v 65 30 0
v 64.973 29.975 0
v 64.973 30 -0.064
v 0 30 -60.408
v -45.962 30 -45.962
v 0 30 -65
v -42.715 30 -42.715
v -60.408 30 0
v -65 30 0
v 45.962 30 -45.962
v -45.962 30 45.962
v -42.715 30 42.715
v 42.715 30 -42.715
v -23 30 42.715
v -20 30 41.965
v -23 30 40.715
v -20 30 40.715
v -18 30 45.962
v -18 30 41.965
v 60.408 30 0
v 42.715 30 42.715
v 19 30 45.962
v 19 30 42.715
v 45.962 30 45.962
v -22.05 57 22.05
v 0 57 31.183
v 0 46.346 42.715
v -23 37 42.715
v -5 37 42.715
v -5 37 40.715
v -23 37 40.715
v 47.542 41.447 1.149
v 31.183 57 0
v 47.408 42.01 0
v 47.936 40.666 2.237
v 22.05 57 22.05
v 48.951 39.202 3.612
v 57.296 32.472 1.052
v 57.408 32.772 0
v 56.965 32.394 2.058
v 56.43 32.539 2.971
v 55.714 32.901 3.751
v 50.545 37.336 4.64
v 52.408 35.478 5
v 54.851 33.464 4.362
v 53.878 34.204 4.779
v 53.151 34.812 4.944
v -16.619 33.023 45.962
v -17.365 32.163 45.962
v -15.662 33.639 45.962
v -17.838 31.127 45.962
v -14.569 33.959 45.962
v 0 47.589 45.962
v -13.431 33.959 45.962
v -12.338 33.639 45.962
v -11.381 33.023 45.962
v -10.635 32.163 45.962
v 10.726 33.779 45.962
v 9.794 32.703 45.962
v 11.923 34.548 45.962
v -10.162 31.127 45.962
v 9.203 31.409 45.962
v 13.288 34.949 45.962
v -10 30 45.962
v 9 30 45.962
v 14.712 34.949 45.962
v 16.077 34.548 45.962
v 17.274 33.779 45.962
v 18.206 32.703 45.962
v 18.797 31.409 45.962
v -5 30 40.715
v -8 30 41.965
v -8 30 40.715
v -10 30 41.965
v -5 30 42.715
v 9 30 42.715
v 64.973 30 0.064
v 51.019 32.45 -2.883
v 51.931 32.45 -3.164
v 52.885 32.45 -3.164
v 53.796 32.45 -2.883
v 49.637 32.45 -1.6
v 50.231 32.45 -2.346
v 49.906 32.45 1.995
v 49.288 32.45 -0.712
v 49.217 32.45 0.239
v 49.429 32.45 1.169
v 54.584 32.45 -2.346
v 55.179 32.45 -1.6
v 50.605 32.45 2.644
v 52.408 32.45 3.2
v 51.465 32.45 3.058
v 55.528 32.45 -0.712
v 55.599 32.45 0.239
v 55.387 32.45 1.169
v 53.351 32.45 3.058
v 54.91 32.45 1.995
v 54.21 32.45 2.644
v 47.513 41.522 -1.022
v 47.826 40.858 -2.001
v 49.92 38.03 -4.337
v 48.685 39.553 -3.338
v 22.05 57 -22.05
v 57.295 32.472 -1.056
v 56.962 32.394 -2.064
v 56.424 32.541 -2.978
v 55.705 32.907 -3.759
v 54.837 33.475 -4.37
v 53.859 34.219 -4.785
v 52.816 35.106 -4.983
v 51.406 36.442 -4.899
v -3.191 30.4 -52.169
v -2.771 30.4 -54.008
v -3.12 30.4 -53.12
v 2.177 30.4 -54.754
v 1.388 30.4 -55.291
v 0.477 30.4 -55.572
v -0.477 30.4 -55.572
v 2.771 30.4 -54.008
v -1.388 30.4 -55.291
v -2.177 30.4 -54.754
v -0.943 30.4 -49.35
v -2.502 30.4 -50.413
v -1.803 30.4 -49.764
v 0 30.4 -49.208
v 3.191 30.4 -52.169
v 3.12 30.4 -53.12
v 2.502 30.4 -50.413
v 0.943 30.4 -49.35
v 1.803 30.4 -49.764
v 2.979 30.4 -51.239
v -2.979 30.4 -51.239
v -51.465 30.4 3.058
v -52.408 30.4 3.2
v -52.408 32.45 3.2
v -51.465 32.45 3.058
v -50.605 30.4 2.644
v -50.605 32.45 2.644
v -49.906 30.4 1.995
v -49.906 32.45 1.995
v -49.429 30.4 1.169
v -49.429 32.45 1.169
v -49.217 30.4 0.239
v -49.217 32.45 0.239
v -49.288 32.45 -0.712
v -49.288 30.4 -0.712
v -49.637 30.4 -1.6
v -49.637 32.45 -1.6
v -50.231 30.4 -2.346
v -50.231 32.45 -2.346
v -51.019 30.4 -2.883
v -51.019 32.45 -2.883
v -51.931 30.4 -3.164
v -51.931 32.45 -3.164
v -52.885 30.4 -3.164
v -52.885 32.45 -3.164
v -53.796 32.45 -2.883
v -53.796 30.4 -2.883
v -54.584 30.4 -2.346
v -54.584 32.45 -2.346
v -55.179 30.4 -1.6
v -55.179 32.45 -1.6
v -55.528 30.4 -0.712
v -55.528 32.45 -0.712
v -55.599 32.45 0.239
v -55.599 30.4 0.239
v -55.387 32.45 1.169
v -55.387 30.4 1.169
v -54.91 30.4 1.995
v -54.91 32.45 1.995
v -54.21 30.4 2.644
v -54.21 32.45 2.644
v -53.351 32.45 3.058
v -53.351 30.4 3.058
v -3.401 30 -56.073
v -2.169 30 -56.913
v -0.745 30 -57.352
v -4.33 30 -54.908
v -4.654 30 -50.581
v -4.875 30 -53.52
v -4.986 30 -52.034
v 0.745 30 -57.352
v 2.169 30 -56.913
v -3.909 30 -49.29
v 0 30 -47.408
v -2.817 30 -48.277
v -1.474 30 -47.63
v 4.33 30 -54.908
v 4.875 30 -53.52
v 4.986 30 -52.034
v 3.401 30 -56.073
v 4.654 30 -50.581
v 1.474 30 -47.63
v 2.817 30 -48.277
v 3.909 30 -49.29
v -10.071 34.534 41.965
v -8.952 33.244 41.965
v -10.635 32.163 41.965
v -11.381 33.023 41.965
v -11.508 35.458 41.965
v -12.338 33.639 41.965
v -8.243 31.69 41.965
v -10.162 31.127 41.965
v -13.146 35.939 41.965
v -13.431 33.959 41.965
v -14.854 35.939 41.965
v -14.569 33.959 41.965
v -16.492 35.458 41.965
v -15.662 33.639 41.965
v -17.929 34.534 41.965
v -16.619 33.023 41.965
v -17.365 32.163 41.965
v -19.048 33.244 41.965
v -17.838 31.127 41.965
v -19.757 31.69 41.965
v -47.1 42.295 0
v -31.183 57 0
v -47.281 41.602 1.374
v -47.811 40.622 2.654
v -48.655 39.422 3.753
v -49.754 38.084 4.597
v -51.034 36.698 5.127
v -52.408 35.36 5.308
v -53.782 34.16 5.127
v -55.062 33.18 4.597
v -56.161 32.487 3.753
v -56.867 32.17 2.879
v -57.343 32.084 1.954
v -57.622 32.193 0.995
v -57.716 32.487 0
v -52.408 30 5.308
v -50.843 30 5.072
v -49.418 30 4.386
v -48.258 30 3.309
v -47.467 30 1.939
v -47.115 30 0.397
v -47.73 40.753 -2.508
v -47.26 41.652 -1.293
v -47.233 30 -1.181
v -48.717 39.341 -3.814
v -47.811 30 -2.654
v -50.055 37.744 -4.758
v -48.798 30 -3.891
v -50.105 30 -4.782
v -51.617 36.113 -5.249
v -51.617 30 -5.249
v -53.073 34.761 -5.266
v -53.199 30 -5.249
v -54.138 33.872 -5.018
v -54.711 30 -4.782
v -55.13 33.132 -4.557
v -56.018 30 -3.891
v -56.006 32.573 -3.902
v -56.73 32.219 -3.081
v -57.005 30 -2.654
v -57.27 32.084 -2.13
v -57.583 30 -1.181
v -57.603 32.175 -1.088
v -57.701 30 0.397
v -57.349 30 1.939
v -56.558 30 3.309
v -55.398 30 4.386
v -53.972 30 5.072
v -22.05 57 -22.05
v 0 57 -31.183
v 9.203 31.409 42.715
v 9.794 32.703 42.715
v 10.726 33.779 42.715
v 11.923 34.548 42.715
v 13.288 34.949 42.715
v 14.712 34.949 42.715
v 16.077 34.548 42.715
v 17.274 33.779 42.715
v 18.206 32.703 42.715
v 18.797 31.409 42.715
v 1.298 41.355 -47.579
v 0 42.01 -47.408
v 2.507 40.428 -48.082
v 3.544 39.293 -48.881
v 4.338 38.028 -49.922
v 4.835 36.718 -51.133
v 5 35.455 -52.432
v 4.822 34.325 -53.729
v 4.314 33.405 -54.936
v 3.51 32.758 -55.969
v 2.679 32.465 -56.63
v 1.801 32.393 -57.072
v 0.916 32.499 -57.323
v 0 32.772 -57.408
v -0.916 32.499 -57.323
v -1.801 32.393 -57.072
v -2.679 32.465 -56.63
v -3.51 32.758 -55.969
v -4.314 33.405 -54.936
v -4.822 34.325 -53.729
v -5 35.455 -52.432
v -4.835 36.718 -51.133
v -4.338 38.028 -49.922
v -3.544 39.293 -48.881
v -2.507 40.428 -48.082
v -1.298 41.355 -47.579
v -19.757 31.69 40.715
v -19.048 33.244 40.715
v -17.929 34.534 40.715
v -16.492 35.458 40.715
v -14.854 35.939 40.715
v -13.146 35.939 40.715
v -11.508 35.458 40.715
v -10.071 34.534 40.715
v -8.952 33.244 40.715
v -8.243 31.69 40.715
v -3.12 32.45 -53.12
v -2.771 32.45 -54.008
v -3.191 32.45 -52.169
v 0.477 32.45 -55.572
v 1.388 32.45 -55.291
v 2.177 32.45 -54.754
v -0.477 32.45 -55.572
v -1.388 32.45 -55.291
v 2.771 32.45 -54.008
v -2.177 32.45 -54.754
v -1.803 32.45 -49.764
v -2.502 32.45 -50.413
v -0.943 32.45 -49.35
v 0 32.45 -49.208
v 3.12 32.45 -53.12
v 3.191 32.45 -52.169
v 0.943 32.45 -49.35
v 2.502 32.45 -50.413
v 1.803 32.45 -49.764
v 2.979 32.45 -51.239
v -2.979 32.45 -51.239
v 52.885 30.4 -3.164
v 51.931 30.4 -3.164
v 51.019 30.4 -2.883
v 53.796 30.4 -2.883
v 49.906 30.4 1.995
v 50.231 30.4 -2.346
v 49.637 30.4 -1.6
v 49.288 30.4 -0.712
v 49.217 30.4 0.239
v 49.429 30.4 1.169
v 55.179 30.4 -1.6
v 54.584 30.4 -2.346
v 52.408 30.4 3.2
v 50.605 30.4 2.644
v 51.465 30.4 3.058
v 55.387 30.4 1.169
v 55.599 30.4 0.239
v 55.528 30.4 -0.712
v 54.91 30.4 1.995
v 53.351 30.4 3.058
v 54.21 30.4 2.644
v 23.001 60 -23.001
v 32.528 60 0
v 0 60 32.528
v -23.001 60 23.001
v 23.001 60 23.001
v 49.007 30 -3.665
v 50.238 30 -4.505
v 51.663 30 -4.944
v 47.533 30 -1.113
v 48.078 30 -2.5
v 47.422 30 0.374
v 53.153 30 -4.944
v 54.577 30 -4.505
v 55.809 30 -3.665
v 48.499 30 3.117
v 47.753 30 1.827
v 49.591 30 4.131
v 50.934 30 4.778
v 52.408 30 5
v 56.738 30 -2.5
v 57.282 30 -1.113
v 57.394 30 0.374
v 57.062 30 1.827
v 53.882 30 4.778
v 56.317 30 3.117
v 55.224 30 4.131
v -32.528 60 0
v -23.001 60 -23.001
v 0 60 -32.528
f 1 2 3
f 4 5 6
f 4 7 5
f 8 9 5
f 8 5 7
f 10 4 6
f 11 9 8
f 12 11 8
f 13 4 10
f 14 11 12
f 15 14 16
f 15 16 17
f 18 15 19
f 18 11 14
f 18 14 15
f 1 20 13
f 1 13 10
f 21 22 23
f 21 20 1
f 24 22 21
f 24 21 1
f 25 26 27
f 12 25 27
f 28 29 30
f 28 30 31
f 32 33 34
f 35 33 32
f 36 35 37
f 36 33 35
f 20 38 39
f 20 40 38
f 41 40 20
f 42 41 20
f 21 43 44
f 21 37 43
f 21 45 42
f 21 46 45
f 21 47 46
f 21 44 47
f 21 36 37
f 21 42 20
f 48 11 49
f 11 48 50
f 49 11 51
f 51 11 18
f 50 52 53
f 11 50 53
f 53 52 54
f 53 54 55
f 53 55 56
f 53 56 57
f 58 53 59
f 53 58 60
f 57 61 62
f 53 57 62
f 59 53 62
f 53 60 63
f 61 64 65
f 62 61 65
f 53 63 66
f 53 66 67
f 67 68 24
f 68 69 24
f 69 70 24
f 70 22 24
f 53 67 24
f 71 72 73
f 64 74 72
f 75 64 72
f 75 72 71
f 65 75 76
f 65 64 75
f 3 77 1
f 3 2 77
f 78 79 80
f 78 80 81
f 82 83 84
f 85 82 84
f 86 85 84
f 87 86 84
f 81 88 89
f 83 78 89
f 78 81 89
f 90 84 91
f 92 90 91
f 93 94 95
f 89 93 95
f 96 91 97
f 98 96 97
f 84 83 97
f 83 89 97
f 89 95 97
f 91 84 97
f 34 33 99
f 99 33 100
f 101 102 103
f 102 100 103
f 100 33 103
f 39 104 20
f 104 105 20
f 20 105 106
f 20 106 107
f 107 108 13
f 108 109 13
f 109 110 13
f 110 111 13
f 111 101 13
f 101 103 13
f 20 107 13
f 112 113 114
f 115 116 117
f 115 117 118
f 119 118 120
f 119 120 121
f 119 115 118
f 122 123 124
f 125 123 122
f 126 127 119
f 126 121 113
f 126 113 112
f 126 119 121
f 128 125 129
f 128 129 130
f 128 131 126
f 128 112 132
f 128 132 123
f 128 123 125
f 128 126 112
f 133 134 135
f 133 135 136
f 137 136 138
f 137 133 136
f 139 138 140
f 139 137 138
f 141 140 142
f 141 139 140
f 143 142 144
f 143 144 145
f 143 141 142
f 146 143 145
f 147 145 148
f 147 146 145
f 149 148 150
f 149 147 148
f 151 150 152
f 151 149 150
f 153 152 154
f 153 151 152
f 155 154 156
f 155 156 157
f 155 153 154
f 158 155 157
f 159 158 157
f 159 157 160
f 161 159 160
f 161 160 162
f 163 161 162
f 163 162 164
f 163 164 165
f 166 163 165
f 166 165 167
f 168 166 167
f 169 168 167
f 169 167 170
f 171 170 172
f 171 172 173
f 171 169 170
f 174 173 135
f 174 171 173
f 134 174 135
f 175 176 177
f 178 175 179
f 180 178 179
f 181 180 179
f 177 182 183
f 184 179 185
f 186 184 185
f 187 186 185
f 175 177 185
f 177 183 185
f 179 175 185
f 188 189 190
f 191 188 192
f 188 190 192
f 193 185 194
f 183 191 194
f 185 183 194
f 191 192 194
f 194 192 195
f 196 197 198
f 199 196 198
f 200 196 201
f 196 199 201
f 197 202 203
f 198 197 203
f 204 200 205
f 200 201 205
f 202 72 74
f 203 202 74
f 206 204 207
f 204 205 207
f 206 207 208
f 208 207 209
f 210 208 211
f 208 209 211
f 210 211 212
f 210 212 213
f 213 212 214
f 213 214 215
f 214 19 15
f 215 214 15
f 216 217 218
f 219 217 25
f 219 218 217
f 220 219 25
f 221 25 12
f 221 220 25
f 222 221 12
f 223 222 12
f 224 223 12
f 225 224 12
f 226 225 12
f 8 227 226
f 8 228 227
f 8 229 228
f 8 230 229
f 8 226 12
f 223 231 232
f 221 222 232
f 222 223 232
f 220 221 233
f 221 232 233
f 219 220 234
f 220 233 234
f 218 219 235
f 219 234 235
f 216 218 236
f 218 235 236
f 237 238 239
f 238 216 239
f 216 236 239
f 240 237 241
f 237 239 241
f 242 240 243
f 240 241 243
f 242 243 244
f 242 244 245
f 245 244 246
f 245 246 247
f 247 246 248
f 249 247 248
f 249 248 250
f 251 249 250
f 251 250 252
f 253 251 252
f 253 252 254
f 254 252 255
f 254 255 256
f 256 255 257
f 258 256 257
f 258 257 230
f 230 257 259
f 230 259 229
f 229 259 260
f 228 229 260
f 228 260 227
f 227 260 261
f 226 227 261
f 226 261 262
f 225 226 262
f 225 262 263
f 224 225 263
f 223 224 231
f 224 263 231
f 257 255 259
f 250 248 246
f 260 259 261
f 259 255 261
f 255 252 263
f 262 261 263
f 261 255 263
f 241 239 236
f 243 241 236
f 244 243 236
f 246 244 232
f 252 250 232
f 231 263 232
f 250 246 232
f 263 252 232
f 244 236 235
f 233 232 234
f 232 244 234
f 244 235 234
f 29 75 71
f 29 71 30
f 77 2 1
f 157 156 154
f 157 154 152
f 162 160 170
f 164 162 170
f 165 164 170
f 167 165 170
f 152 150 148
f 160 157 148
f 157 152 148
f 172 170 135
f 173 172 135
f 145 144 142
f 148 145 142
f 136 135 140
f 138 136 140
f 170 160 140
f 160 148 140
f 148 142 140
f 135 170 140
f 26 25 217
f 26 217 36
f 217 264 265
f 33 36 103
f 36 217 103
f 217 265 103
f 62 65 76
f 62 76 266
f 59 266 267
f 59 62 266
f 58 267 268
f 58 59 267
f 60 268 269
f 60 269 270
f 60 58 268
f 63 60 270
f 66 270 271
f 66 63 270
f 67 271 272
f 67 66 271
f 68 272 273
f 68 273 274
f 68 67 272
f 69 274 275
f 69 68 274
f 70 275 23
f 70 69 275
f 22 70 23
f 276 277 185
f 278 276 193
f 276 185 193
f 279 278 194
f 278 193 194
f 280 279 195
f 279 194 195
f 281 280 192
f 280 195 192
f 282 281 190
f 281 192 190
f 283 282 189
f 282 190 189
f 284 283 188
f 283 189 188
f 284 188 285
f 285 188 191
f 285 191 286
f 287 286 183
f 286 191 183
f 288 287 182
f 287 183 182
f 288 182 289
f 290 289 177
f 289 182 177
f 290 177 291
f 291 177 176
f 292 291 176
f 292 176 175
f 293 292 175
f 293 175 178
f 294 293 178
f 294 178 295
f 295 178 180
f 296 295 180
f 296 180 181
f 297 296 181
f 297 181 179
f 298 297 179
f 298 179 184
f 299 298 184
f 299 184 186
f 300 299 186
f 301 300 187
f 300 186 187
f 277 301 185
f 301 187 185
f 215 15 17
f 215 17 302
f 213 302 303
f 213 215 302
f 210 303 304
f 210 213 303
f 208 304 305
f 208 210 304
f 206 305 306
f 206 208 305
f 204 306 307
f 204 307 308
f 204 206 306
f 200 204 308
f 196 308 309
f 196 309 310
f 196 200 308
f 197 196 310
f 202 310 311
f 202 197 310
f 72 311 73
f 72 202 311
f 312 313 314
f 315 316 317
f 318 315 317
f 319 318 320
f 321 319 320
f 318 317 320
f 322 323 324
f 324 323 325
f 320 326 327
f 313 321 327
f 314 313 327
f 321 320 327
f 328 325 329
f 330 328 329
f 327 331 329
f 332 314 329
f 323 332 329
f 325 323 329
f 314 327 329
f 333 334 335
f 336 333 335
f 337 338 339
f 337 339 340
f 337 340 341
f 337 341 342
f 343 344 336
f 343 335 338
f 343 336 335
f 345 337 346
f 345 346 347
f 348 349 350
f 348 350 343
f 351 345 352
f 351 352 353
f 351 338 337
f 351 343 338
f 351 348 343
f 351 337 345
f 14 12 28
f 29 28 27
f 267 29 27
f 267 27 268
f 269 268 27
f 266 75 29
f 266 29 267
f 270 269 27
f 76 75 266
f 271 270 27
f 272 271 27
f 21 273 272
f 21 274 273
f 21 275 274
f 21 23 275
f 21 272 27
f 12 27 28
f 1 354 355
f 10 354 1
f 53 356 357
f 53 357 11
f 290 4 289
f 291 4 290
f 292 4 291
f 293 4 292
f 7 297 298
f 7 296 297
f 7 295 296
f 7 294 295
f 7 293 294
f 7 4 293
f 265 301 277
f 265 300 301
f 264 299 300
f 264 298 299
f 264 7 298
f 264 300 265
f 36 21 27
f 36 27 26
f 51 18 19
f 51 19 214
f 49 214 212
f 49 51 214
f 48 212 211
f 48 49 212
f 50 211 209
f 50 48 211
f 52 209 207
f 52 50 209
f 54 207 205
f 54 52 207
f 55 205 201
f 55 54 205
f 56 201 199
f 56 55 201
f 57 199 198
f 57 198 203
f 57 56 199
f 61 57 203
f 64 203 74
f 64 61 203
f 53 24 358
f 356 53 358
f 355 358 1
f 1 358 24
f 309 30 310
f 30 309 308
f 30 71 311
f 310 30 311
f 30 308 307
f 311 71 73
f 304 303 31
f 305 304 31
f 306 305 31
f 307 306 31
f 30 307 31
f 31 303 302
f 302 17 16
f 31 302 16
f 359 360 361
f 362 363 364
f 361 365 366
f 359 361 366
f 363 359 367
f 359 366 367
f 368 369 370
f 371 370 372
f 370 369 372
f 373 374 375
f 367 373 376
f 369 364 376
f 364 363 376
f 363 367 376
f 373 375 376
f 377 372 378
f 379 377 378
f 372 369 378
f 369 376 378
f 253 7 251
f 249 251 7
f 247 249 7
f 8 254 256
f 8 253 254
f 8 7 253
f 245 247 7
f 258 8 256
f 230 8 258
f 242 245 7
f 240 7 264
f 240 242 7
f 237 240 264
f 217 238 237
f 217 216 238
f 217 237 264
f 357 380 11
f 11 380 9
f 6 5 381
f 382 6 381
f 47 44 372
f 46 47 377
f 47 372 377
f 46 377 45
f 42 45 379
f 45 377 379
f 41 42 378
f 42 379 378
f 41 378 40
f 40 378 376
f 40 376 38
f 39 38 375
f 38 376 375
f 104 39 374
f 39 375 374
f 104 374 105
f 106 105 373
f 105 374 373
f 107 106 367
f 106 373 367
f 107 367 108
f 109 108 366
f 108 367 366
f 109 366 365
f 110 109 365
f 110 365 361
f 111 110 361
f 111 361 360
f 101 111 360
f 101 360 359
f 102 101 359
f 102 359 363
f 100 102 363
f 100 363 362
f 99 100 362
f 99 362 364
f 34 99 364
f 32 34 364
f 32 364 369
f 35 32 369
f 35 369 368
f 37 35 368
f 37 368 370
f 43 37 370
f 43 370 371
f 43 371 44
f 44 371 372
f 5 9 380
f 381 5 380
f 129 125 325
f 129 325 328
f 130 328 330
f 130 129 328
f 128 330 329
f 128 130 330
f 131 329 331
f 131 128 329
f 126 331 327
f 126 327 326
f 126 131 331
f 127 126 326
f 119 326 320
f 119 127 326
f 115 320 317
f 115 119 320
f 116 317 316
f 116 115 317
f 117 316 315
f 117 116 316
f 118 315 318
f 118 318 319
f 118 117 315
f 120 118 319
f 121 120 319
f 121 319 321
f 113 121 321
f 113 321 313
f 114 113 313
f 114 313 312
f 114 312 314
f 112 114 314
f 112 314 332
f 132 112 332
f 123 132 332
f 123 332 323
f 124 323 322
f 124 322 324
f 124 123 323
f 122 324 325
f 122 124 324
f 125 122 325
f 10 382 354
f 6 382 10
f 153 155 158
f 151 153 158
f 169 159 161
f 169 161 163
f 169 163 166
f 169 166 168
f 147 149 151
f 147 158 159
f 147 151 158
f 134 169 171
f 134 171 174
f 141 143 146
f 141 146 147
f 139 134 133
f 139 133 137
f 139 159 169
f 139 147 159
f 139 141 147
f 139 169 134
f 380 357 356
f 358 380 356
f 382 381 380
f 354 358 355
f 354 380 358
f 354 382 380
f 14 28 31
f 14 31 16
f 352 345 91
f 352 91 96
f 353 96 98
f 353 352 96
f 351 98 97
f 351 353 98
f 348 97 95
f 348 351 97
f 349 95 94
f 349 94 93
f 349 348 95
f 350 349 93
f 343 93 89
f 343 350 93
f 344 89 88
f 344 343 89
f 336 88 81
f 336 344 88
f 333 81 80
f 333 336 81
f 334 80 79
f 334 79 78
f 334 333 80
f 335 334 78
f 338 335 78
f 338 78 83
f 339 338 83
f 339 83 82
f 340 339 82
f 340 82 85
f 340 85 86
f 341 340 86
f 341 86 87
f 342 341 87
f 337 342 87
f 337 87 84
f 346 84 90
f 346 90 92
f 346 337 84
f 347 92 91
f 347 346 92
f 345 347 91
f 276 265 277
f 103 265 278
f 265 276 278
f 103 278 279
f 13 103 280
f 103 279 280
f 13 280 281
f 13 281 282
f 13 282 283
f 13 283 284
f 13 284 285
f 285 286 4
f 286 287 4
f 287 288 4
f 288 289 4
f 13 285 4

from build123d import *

# Parameters (mm, degrees)
AUFSATZ_LINEAR_AUSTRAGEN1_DEPTH       = 30
SCHNITT_LINEAR_AUSTRAGEN4_DEPTH       = 162.727828845
SCHNITT_LINEAR_AUSTRAGEN5_DEPTH       = 162.727828845
SCHNITT_LINEAR_AUSTRAGEN6_DEPTH       = 162.727828845
SCHNITT_LINEAR_AUSTRAGEN7_DEPTH       = 162.727828845
WANDUNG1_T                            = -3
SCHNITT_LINEAR_AUSTRAGEN12_DEPTH      = 97.695398029
SCHNITT_LINEAR_AUSTRAGEN12_DEPTH_BACK = 97.695398029
AUFSATZ_LINEAR_AUSTRAGEN3_REACH       = 98.695
SKIZZE17_W                            = 85.429528352
SKIZZE17_H                            = 3.247176601
SCHNITT_LINEAR_AUSTRAGEN14_REACH      = 134.051
SKIZZE18_R                            = 4
SKIZZE18_R_2                          = 5
AUFSATZ_LINEAR_AUSTRAGEN4_DEPTH       = 0.75
AUFSATZ_LINEAR_AUSTRAGEN5_DEPTH       = 2
AUFSATZ_LINEAR_AUSTRAGEN9_REACH       = 98.695
SKIZZE23_R                            = 5.307840289
SKIZZE23_R_2                          = 5
SKIZZE25_R                            = 3.2
SCHNITT_LINEAR_AUSTRAGEN15_DEPTH      = 2.05
SCHNITT_LINEAR_AUSTRAGEN16_DEPTH      = 110.772492001
SCHNITT_LINEAR_AUSTRAGEN16_DEPTH_BACK = 110.772492001
SKIZZE26_W                            = 129.973453239
SKIZZE26_H                            = 30


with BuildPart() as part:
    # Skizze1 → Aufsatz-Linear austragen1 (new body)
    with BuildSketch(Plane(origin=(0, 0, 0), x_dir=(1, 0, 0), z_dir=(0, 1, 0))):
        Polygon((45.961940777, -45.961940777), (65, 0), (45.961940777, 45.961940777), (0, 65), (-45.961940777, 45.961940777), (-65, 0), (-45.961940777, -45.961940777), (0, -65), align=None)
    extrude(amount=AUFSATZ_LINEAR_AUSTRAGEN1_DEPTH)

    # Skizze6 → Schnitt-Linear austragen4 (cut, through all)
    with BuildSketch(Plane(origin=(-26.807804712, 0, 64.719765714), x_dir=(0.9238795325112876, 0, 0.3826834323650878), z_dir=(-0.38268343236508773, 0, 0.9238795325112875))):
        Polygon((-60.052169613, 30), (-30.052169613, 0), (-60.052169613, 0), align=None)
        Polygon((30.052169613, 0), (60.052169613, 30), (60.052169613, 0), align=None)
    extrude(amount=-SCHNITT_LINEAR_AUSTRAGEN4_DEPTH, mode=Mode.SUBTRACT)

    # Skizze7 → Schnitt-Linear austragen5 (cut, through all)
    with BuildSketch(Plane(origin=(-64.719765714, 0, 26.807804712), x_dir=(0.3826834323650837, 0, 0.9238795325112893), z_dir=(-0.9238795325112893, 0, 0.3826834323650837))):
        Polygon((-60.052169613, 30), (-30.052169613, 0), (-60.052169613, 0), align=None)
        Polygon((30.052169613, 0), (60.052169613, 0), (60.052169613, 30), align=None)
    extrude(amount=-SCHNITT_LINEAR_AUSTRAGEN5_DEPTH, mode=Mode.SUBTRACT)

    # Skizze8 → Schnitt-Linear austragen6 (cut, through all)
    with BuildSketch(Plane(origin=(-64.719765714, 0, -26.807804712), x_dir=(-0.38268343236508795, 0, 0.9238795325112876), z_dir=(-0.9238795325112876, 0, -0.38268343236508795))):
        Polygon((-60.052169613, 30), (-60.052169613, 0), (-30.052169613, 0), align=None)
        Polygon((60.052169613, 30), (60.052169613, 0), (30.052169613, 0), align=None)
    extrude(amount=-SCHNITT_LINEAR_AUSTRAGEN6_DEPTH, mode=Mode.SUBTRACT)

    # Skizze9 → Schnitt-Linear austragen7 (cut, through all)
    with BuildSketch(Plane(origin=(-26.807804712, 0, -64.719765714), x_dir=(-0.9238795325112894, 0, 0.3826834323650834), z_dir=(-0.3826834323650834, 0, -0.9238795325112894))):
        Polygon((60.052169613, 30), (60.052169613, 0), (30.052169613, 0), align=None)
        Polygon((-60.052169613, 30), (-60.052169613, 0), (-30.052169613, 0), align=None)
    extrude(amount=-SCHNITT_LINEAR_AUSTRAGEN7_DEPTH, mode=Mode.SUBTRACT)

    # Wandung1
    wandung1_openings = [part.faces().sort_by_distance(p)[0] for p in [
        (0, 30, 0),
    ]]
    offset(amount=WANDUNG1_T, openings=wandung1_openings, kind=Kind.INTERSECTION)

    # Skizze15 → Schnitt-Linear austragen12 (cut, two sides: drawn at the far end of the back side and taken through both)
    with BuildSketch(Plane(origin=(0, 0, 0), x_dir=(0, 0, -1), z_dir=(1, 0, 0)).offset(-SCHNITT_LINEAR_AUSTRAGEN12_DEPTH_BACK)):
        Polygon((-45.961940777, 30), (-45.961940777, 12.411126745), (-65, 30), align=None)
    extrude(amount=SCHNITT_LINEAR_AUSTRAGEN12_DEPTH + SCHNITT_LINEAR_AUSTRAGEN12_DEPTH_BACK, mode=Mode.SUBTRACT)

    # Skizze17 → Aufsatz-Linear austragen3 (add, up to next)
    with BuildSketch(Plane(origin=(0, 30, 0), x_dir=(1, 0, 0), z_dir=(0, 1, 0)), mode=Mode.PRIVATE) as aufsatz_linear_austragen3_sk1:
        with Locations((0, -44.338352477)):
            Rectangle(SKIZZE17_W, SKIZZE17_H)
    aufsatz_linear_austragen3_tool1 = extrude(aufsatz_linear_austragen3_sk1.sketch, amount=-AUFSATZ_LINEAR_AUSTRAGEN3_REACH, mode=Mode.PRIVATE) - part.part
    add(aufsatz_linear_austragen3_tool1.solids().sort_by_distance((0, 30, 44.338352))[0])

    # Skizze18 → Schnitt-Linear austragen14 (cut, up to next)
    with BuildSketch(Plane.XY.offset(45.961940777), mode=Mode.PRIVATE) as schnitt_linear_austragen14_sk1:
        with Locations((-14, 30)):
            Circle(SKIZZE18_R)
    schnitt_linear_austragen14_tool1 = extrude(schnitt_linear_austragen14_sk1.sketch, amount=-SCHNITT_LINEAR_AUSTRAGEN14_REACH, mode=Mode.PRIVATE) & part.part
    # Skizze18 → Schnitt-Linear austragen14 (cut, up to next)
    with BuildSketch(Plane.XY.offset(45.961940777), mode=Mode.PRIVATE) as schnitt_linear_austragen14_sk2:
        with Locations((14, 30)):
            Circle(SKIZZE18_R_2)
    schnitt_linear_austragen14_tool2 = extrude(schnitt_linear_austragen14_sk2.sketch, amount=-SCHNITT_LINEAR_AUSTRAGEN14_REACH, mode=Mode.PRIVATE) & part.part
    add(schnitt_linear_austragen14_tool1.solids().sort_by_distance((-14, 30, 45.961941))[0], mode=Mode.SUBTRACT)
    add(schnitt_linear_austragen14_tool2.solids().sort_by_distance((14, 30, 45.961941))[0], mode=Mode.SUBTRACT)

    # Skizze19 → Aufsatz-Linear austragen4 (add)
    with BuildSketch(Plane(origin=(0, 0, 42.714764176), x_dir=(-1, 0, 0), z_dir=(0, 0, -1))):
        with BuildLine():
            Line((10, 30), (8, 30))
            ThreePointArc((8, 30), (14, 24), (20, 30))
            Line((20, 30), (18, 30))
            ThreePointArc((18, 30), (14, 26), (10, 30))
        make_face()
    extrude(amount=AUFSATZ_LINEAR_AUSTRAGEN4_DEPTH)

    # Skizze20 → Aufsatz-Linear austragen5 (add)
    with BuildSketch(Plane(origin=(0, 0, 42.714764176), x_dir=(-1, 0, 0), z_dir=(0, 0, -1))):
        with BuildLine():
            Line((8, 30), (5, 30))
            Line((5, 30), (5, 23))
            Line((5, 23), (23, 23))
            Line((23, 23), (23, 30))
            Line((23, 30), (20, 30))
            ThreePointArc((20, 30), (14, 24), (8, 30))
        make_face()
    extrude(amount=AUFSATZ_LINEAR_AUSTRAGEN5_DEPTH)

    # Skizze23 → Aufsatz-Linear austragen9 (add, up to next)
    with BuildSketch(Plane(origin=(0, 30, 0), x_dir=(1, 0, 0), z_dir=(0, 1, 0)), mode=Mode.PRIVATE) as aufsatz_linear_austragen9_sk1:
        with Locations(Location((-52.407798812, 0, 0), (0, 0, 270))):
            Circle(SKIZZE23_R)
    aufsatz_linear_austragen9_tool1 = extrude(aufsatz_linear_austragen9_sk1.sketch, amount=-AUFSATZ_LINEAR_AUSTRAGEN9_REACH, mode=Mode.PRIVATE) - part.part
    # Skizze23 → Aufsatz-Linear austragen9 (add, up to next)
    with BuildSketch(Plane(origin=(0, 30, 0), x_dir=(1, 0, 0), z_dir=(0, 1, 0)), mode=Mode.PRIVATE) as aufsatz_linear_austragen9_sk2:
        with Locations(Location((52.407798812, 0, 0), (0, 0, 270))):
            Circle(SKIZZE23_R_2)
    aufsatz_linear_austragen9_tool2 = extrude(aufsatz_linear_austragen9_sk2.sketch, amount=-AUFSATZ_LINEAR_AUSTRAGEN9_REACH, mode=Mode.PRIVATE) - part.part
    # Skizze23 → Aufsatz-Linear austragen9 (add, up to next)
    with BuildSketch(Plane(origin=(0, 30, 0), x_dir=(1, 0, 0), z_dir=(0, 1, 0)), mode=Mode.PRIVATE) as aufsatz_linear_austragen9_sk3:
        with Locations(Location((0, 52.407798812, 0), (0, 0, 270))):
            Circle(SKIZZE23_R_2)
    aufsatz_linear_austragen9_tool3 = extrude(aufsatz_linear_austragen9_sk3.sketch, amount=-AUFSATZ_LINEAR_AUSTRAGEN9_REACH, mode=Mode.PRIVATE) - part.part
    add(aufsatz_linear_austragen9_tool1.solids().sort_by_distance((-52.407799, 30, 0))[0])
    add(aufsatz_linear_austragen9_tool2.solids().sort_by_distance((52.407799, 30, 0))[0])
    add(aufsatz_linear_austragen9_tool3.solids().sort_by_distance((0, 30, -52.407799))[0])

    # Skizze25 → Schnitt-Linear austragen15 (cut)
    with BuildSketch(Plane(origin=(0, 29.6, 0), x_dir=(1, 0, 0), z_dir=(0, 1, 0))):
        with Locations(Location((0, 52.407798812, 0), (0, 0, 270))):
            Circle(SKIZZE25_R)
        with Locations(Location((52.407798812, 0, 0), (0, 0, 270))):
            Circle(SKIZZE25_R)
        with Locations(Location((-52.407798812, 0, 0), (0, 0, 270))):
            Circle(SKIZZE25_R)
    extrude(amount=-SCHNITT_LINEAR_AUSTRAGEN15_DEPTH, mode=Mode.SUBTRACT)


with BuildPart() as body_2:
    # Spiegeln2: mirrored copy
    add(part.part.mirror(Plane.ZX.offset(30)))


with BuildPart() as part_1:
    add(part.part)

    # Skizze26 → Schnitt-Linear austragen16 (cut, two sides: drawn at the far end of the back side and taken through both)
    with BuildSketch(Plane.XY.offset(-SCHNITT_LINEAR_AUSTRAGEN16_DEPTH_BACK)):
        with Locations((-0.01327338, 15)):
            Rectangle(SKIZZE26_W, SKIZZE26_H)
    extrude(amount=SCHNITT_LINEAR_AUSTRAGEN16_DEPTH + SCHNITT_LINEAR_AUSTRAGEN16_DEPTH_BACK, mode=Mode.SUBTRACT)


solid = Compound([body_2.part, part_1.part])
